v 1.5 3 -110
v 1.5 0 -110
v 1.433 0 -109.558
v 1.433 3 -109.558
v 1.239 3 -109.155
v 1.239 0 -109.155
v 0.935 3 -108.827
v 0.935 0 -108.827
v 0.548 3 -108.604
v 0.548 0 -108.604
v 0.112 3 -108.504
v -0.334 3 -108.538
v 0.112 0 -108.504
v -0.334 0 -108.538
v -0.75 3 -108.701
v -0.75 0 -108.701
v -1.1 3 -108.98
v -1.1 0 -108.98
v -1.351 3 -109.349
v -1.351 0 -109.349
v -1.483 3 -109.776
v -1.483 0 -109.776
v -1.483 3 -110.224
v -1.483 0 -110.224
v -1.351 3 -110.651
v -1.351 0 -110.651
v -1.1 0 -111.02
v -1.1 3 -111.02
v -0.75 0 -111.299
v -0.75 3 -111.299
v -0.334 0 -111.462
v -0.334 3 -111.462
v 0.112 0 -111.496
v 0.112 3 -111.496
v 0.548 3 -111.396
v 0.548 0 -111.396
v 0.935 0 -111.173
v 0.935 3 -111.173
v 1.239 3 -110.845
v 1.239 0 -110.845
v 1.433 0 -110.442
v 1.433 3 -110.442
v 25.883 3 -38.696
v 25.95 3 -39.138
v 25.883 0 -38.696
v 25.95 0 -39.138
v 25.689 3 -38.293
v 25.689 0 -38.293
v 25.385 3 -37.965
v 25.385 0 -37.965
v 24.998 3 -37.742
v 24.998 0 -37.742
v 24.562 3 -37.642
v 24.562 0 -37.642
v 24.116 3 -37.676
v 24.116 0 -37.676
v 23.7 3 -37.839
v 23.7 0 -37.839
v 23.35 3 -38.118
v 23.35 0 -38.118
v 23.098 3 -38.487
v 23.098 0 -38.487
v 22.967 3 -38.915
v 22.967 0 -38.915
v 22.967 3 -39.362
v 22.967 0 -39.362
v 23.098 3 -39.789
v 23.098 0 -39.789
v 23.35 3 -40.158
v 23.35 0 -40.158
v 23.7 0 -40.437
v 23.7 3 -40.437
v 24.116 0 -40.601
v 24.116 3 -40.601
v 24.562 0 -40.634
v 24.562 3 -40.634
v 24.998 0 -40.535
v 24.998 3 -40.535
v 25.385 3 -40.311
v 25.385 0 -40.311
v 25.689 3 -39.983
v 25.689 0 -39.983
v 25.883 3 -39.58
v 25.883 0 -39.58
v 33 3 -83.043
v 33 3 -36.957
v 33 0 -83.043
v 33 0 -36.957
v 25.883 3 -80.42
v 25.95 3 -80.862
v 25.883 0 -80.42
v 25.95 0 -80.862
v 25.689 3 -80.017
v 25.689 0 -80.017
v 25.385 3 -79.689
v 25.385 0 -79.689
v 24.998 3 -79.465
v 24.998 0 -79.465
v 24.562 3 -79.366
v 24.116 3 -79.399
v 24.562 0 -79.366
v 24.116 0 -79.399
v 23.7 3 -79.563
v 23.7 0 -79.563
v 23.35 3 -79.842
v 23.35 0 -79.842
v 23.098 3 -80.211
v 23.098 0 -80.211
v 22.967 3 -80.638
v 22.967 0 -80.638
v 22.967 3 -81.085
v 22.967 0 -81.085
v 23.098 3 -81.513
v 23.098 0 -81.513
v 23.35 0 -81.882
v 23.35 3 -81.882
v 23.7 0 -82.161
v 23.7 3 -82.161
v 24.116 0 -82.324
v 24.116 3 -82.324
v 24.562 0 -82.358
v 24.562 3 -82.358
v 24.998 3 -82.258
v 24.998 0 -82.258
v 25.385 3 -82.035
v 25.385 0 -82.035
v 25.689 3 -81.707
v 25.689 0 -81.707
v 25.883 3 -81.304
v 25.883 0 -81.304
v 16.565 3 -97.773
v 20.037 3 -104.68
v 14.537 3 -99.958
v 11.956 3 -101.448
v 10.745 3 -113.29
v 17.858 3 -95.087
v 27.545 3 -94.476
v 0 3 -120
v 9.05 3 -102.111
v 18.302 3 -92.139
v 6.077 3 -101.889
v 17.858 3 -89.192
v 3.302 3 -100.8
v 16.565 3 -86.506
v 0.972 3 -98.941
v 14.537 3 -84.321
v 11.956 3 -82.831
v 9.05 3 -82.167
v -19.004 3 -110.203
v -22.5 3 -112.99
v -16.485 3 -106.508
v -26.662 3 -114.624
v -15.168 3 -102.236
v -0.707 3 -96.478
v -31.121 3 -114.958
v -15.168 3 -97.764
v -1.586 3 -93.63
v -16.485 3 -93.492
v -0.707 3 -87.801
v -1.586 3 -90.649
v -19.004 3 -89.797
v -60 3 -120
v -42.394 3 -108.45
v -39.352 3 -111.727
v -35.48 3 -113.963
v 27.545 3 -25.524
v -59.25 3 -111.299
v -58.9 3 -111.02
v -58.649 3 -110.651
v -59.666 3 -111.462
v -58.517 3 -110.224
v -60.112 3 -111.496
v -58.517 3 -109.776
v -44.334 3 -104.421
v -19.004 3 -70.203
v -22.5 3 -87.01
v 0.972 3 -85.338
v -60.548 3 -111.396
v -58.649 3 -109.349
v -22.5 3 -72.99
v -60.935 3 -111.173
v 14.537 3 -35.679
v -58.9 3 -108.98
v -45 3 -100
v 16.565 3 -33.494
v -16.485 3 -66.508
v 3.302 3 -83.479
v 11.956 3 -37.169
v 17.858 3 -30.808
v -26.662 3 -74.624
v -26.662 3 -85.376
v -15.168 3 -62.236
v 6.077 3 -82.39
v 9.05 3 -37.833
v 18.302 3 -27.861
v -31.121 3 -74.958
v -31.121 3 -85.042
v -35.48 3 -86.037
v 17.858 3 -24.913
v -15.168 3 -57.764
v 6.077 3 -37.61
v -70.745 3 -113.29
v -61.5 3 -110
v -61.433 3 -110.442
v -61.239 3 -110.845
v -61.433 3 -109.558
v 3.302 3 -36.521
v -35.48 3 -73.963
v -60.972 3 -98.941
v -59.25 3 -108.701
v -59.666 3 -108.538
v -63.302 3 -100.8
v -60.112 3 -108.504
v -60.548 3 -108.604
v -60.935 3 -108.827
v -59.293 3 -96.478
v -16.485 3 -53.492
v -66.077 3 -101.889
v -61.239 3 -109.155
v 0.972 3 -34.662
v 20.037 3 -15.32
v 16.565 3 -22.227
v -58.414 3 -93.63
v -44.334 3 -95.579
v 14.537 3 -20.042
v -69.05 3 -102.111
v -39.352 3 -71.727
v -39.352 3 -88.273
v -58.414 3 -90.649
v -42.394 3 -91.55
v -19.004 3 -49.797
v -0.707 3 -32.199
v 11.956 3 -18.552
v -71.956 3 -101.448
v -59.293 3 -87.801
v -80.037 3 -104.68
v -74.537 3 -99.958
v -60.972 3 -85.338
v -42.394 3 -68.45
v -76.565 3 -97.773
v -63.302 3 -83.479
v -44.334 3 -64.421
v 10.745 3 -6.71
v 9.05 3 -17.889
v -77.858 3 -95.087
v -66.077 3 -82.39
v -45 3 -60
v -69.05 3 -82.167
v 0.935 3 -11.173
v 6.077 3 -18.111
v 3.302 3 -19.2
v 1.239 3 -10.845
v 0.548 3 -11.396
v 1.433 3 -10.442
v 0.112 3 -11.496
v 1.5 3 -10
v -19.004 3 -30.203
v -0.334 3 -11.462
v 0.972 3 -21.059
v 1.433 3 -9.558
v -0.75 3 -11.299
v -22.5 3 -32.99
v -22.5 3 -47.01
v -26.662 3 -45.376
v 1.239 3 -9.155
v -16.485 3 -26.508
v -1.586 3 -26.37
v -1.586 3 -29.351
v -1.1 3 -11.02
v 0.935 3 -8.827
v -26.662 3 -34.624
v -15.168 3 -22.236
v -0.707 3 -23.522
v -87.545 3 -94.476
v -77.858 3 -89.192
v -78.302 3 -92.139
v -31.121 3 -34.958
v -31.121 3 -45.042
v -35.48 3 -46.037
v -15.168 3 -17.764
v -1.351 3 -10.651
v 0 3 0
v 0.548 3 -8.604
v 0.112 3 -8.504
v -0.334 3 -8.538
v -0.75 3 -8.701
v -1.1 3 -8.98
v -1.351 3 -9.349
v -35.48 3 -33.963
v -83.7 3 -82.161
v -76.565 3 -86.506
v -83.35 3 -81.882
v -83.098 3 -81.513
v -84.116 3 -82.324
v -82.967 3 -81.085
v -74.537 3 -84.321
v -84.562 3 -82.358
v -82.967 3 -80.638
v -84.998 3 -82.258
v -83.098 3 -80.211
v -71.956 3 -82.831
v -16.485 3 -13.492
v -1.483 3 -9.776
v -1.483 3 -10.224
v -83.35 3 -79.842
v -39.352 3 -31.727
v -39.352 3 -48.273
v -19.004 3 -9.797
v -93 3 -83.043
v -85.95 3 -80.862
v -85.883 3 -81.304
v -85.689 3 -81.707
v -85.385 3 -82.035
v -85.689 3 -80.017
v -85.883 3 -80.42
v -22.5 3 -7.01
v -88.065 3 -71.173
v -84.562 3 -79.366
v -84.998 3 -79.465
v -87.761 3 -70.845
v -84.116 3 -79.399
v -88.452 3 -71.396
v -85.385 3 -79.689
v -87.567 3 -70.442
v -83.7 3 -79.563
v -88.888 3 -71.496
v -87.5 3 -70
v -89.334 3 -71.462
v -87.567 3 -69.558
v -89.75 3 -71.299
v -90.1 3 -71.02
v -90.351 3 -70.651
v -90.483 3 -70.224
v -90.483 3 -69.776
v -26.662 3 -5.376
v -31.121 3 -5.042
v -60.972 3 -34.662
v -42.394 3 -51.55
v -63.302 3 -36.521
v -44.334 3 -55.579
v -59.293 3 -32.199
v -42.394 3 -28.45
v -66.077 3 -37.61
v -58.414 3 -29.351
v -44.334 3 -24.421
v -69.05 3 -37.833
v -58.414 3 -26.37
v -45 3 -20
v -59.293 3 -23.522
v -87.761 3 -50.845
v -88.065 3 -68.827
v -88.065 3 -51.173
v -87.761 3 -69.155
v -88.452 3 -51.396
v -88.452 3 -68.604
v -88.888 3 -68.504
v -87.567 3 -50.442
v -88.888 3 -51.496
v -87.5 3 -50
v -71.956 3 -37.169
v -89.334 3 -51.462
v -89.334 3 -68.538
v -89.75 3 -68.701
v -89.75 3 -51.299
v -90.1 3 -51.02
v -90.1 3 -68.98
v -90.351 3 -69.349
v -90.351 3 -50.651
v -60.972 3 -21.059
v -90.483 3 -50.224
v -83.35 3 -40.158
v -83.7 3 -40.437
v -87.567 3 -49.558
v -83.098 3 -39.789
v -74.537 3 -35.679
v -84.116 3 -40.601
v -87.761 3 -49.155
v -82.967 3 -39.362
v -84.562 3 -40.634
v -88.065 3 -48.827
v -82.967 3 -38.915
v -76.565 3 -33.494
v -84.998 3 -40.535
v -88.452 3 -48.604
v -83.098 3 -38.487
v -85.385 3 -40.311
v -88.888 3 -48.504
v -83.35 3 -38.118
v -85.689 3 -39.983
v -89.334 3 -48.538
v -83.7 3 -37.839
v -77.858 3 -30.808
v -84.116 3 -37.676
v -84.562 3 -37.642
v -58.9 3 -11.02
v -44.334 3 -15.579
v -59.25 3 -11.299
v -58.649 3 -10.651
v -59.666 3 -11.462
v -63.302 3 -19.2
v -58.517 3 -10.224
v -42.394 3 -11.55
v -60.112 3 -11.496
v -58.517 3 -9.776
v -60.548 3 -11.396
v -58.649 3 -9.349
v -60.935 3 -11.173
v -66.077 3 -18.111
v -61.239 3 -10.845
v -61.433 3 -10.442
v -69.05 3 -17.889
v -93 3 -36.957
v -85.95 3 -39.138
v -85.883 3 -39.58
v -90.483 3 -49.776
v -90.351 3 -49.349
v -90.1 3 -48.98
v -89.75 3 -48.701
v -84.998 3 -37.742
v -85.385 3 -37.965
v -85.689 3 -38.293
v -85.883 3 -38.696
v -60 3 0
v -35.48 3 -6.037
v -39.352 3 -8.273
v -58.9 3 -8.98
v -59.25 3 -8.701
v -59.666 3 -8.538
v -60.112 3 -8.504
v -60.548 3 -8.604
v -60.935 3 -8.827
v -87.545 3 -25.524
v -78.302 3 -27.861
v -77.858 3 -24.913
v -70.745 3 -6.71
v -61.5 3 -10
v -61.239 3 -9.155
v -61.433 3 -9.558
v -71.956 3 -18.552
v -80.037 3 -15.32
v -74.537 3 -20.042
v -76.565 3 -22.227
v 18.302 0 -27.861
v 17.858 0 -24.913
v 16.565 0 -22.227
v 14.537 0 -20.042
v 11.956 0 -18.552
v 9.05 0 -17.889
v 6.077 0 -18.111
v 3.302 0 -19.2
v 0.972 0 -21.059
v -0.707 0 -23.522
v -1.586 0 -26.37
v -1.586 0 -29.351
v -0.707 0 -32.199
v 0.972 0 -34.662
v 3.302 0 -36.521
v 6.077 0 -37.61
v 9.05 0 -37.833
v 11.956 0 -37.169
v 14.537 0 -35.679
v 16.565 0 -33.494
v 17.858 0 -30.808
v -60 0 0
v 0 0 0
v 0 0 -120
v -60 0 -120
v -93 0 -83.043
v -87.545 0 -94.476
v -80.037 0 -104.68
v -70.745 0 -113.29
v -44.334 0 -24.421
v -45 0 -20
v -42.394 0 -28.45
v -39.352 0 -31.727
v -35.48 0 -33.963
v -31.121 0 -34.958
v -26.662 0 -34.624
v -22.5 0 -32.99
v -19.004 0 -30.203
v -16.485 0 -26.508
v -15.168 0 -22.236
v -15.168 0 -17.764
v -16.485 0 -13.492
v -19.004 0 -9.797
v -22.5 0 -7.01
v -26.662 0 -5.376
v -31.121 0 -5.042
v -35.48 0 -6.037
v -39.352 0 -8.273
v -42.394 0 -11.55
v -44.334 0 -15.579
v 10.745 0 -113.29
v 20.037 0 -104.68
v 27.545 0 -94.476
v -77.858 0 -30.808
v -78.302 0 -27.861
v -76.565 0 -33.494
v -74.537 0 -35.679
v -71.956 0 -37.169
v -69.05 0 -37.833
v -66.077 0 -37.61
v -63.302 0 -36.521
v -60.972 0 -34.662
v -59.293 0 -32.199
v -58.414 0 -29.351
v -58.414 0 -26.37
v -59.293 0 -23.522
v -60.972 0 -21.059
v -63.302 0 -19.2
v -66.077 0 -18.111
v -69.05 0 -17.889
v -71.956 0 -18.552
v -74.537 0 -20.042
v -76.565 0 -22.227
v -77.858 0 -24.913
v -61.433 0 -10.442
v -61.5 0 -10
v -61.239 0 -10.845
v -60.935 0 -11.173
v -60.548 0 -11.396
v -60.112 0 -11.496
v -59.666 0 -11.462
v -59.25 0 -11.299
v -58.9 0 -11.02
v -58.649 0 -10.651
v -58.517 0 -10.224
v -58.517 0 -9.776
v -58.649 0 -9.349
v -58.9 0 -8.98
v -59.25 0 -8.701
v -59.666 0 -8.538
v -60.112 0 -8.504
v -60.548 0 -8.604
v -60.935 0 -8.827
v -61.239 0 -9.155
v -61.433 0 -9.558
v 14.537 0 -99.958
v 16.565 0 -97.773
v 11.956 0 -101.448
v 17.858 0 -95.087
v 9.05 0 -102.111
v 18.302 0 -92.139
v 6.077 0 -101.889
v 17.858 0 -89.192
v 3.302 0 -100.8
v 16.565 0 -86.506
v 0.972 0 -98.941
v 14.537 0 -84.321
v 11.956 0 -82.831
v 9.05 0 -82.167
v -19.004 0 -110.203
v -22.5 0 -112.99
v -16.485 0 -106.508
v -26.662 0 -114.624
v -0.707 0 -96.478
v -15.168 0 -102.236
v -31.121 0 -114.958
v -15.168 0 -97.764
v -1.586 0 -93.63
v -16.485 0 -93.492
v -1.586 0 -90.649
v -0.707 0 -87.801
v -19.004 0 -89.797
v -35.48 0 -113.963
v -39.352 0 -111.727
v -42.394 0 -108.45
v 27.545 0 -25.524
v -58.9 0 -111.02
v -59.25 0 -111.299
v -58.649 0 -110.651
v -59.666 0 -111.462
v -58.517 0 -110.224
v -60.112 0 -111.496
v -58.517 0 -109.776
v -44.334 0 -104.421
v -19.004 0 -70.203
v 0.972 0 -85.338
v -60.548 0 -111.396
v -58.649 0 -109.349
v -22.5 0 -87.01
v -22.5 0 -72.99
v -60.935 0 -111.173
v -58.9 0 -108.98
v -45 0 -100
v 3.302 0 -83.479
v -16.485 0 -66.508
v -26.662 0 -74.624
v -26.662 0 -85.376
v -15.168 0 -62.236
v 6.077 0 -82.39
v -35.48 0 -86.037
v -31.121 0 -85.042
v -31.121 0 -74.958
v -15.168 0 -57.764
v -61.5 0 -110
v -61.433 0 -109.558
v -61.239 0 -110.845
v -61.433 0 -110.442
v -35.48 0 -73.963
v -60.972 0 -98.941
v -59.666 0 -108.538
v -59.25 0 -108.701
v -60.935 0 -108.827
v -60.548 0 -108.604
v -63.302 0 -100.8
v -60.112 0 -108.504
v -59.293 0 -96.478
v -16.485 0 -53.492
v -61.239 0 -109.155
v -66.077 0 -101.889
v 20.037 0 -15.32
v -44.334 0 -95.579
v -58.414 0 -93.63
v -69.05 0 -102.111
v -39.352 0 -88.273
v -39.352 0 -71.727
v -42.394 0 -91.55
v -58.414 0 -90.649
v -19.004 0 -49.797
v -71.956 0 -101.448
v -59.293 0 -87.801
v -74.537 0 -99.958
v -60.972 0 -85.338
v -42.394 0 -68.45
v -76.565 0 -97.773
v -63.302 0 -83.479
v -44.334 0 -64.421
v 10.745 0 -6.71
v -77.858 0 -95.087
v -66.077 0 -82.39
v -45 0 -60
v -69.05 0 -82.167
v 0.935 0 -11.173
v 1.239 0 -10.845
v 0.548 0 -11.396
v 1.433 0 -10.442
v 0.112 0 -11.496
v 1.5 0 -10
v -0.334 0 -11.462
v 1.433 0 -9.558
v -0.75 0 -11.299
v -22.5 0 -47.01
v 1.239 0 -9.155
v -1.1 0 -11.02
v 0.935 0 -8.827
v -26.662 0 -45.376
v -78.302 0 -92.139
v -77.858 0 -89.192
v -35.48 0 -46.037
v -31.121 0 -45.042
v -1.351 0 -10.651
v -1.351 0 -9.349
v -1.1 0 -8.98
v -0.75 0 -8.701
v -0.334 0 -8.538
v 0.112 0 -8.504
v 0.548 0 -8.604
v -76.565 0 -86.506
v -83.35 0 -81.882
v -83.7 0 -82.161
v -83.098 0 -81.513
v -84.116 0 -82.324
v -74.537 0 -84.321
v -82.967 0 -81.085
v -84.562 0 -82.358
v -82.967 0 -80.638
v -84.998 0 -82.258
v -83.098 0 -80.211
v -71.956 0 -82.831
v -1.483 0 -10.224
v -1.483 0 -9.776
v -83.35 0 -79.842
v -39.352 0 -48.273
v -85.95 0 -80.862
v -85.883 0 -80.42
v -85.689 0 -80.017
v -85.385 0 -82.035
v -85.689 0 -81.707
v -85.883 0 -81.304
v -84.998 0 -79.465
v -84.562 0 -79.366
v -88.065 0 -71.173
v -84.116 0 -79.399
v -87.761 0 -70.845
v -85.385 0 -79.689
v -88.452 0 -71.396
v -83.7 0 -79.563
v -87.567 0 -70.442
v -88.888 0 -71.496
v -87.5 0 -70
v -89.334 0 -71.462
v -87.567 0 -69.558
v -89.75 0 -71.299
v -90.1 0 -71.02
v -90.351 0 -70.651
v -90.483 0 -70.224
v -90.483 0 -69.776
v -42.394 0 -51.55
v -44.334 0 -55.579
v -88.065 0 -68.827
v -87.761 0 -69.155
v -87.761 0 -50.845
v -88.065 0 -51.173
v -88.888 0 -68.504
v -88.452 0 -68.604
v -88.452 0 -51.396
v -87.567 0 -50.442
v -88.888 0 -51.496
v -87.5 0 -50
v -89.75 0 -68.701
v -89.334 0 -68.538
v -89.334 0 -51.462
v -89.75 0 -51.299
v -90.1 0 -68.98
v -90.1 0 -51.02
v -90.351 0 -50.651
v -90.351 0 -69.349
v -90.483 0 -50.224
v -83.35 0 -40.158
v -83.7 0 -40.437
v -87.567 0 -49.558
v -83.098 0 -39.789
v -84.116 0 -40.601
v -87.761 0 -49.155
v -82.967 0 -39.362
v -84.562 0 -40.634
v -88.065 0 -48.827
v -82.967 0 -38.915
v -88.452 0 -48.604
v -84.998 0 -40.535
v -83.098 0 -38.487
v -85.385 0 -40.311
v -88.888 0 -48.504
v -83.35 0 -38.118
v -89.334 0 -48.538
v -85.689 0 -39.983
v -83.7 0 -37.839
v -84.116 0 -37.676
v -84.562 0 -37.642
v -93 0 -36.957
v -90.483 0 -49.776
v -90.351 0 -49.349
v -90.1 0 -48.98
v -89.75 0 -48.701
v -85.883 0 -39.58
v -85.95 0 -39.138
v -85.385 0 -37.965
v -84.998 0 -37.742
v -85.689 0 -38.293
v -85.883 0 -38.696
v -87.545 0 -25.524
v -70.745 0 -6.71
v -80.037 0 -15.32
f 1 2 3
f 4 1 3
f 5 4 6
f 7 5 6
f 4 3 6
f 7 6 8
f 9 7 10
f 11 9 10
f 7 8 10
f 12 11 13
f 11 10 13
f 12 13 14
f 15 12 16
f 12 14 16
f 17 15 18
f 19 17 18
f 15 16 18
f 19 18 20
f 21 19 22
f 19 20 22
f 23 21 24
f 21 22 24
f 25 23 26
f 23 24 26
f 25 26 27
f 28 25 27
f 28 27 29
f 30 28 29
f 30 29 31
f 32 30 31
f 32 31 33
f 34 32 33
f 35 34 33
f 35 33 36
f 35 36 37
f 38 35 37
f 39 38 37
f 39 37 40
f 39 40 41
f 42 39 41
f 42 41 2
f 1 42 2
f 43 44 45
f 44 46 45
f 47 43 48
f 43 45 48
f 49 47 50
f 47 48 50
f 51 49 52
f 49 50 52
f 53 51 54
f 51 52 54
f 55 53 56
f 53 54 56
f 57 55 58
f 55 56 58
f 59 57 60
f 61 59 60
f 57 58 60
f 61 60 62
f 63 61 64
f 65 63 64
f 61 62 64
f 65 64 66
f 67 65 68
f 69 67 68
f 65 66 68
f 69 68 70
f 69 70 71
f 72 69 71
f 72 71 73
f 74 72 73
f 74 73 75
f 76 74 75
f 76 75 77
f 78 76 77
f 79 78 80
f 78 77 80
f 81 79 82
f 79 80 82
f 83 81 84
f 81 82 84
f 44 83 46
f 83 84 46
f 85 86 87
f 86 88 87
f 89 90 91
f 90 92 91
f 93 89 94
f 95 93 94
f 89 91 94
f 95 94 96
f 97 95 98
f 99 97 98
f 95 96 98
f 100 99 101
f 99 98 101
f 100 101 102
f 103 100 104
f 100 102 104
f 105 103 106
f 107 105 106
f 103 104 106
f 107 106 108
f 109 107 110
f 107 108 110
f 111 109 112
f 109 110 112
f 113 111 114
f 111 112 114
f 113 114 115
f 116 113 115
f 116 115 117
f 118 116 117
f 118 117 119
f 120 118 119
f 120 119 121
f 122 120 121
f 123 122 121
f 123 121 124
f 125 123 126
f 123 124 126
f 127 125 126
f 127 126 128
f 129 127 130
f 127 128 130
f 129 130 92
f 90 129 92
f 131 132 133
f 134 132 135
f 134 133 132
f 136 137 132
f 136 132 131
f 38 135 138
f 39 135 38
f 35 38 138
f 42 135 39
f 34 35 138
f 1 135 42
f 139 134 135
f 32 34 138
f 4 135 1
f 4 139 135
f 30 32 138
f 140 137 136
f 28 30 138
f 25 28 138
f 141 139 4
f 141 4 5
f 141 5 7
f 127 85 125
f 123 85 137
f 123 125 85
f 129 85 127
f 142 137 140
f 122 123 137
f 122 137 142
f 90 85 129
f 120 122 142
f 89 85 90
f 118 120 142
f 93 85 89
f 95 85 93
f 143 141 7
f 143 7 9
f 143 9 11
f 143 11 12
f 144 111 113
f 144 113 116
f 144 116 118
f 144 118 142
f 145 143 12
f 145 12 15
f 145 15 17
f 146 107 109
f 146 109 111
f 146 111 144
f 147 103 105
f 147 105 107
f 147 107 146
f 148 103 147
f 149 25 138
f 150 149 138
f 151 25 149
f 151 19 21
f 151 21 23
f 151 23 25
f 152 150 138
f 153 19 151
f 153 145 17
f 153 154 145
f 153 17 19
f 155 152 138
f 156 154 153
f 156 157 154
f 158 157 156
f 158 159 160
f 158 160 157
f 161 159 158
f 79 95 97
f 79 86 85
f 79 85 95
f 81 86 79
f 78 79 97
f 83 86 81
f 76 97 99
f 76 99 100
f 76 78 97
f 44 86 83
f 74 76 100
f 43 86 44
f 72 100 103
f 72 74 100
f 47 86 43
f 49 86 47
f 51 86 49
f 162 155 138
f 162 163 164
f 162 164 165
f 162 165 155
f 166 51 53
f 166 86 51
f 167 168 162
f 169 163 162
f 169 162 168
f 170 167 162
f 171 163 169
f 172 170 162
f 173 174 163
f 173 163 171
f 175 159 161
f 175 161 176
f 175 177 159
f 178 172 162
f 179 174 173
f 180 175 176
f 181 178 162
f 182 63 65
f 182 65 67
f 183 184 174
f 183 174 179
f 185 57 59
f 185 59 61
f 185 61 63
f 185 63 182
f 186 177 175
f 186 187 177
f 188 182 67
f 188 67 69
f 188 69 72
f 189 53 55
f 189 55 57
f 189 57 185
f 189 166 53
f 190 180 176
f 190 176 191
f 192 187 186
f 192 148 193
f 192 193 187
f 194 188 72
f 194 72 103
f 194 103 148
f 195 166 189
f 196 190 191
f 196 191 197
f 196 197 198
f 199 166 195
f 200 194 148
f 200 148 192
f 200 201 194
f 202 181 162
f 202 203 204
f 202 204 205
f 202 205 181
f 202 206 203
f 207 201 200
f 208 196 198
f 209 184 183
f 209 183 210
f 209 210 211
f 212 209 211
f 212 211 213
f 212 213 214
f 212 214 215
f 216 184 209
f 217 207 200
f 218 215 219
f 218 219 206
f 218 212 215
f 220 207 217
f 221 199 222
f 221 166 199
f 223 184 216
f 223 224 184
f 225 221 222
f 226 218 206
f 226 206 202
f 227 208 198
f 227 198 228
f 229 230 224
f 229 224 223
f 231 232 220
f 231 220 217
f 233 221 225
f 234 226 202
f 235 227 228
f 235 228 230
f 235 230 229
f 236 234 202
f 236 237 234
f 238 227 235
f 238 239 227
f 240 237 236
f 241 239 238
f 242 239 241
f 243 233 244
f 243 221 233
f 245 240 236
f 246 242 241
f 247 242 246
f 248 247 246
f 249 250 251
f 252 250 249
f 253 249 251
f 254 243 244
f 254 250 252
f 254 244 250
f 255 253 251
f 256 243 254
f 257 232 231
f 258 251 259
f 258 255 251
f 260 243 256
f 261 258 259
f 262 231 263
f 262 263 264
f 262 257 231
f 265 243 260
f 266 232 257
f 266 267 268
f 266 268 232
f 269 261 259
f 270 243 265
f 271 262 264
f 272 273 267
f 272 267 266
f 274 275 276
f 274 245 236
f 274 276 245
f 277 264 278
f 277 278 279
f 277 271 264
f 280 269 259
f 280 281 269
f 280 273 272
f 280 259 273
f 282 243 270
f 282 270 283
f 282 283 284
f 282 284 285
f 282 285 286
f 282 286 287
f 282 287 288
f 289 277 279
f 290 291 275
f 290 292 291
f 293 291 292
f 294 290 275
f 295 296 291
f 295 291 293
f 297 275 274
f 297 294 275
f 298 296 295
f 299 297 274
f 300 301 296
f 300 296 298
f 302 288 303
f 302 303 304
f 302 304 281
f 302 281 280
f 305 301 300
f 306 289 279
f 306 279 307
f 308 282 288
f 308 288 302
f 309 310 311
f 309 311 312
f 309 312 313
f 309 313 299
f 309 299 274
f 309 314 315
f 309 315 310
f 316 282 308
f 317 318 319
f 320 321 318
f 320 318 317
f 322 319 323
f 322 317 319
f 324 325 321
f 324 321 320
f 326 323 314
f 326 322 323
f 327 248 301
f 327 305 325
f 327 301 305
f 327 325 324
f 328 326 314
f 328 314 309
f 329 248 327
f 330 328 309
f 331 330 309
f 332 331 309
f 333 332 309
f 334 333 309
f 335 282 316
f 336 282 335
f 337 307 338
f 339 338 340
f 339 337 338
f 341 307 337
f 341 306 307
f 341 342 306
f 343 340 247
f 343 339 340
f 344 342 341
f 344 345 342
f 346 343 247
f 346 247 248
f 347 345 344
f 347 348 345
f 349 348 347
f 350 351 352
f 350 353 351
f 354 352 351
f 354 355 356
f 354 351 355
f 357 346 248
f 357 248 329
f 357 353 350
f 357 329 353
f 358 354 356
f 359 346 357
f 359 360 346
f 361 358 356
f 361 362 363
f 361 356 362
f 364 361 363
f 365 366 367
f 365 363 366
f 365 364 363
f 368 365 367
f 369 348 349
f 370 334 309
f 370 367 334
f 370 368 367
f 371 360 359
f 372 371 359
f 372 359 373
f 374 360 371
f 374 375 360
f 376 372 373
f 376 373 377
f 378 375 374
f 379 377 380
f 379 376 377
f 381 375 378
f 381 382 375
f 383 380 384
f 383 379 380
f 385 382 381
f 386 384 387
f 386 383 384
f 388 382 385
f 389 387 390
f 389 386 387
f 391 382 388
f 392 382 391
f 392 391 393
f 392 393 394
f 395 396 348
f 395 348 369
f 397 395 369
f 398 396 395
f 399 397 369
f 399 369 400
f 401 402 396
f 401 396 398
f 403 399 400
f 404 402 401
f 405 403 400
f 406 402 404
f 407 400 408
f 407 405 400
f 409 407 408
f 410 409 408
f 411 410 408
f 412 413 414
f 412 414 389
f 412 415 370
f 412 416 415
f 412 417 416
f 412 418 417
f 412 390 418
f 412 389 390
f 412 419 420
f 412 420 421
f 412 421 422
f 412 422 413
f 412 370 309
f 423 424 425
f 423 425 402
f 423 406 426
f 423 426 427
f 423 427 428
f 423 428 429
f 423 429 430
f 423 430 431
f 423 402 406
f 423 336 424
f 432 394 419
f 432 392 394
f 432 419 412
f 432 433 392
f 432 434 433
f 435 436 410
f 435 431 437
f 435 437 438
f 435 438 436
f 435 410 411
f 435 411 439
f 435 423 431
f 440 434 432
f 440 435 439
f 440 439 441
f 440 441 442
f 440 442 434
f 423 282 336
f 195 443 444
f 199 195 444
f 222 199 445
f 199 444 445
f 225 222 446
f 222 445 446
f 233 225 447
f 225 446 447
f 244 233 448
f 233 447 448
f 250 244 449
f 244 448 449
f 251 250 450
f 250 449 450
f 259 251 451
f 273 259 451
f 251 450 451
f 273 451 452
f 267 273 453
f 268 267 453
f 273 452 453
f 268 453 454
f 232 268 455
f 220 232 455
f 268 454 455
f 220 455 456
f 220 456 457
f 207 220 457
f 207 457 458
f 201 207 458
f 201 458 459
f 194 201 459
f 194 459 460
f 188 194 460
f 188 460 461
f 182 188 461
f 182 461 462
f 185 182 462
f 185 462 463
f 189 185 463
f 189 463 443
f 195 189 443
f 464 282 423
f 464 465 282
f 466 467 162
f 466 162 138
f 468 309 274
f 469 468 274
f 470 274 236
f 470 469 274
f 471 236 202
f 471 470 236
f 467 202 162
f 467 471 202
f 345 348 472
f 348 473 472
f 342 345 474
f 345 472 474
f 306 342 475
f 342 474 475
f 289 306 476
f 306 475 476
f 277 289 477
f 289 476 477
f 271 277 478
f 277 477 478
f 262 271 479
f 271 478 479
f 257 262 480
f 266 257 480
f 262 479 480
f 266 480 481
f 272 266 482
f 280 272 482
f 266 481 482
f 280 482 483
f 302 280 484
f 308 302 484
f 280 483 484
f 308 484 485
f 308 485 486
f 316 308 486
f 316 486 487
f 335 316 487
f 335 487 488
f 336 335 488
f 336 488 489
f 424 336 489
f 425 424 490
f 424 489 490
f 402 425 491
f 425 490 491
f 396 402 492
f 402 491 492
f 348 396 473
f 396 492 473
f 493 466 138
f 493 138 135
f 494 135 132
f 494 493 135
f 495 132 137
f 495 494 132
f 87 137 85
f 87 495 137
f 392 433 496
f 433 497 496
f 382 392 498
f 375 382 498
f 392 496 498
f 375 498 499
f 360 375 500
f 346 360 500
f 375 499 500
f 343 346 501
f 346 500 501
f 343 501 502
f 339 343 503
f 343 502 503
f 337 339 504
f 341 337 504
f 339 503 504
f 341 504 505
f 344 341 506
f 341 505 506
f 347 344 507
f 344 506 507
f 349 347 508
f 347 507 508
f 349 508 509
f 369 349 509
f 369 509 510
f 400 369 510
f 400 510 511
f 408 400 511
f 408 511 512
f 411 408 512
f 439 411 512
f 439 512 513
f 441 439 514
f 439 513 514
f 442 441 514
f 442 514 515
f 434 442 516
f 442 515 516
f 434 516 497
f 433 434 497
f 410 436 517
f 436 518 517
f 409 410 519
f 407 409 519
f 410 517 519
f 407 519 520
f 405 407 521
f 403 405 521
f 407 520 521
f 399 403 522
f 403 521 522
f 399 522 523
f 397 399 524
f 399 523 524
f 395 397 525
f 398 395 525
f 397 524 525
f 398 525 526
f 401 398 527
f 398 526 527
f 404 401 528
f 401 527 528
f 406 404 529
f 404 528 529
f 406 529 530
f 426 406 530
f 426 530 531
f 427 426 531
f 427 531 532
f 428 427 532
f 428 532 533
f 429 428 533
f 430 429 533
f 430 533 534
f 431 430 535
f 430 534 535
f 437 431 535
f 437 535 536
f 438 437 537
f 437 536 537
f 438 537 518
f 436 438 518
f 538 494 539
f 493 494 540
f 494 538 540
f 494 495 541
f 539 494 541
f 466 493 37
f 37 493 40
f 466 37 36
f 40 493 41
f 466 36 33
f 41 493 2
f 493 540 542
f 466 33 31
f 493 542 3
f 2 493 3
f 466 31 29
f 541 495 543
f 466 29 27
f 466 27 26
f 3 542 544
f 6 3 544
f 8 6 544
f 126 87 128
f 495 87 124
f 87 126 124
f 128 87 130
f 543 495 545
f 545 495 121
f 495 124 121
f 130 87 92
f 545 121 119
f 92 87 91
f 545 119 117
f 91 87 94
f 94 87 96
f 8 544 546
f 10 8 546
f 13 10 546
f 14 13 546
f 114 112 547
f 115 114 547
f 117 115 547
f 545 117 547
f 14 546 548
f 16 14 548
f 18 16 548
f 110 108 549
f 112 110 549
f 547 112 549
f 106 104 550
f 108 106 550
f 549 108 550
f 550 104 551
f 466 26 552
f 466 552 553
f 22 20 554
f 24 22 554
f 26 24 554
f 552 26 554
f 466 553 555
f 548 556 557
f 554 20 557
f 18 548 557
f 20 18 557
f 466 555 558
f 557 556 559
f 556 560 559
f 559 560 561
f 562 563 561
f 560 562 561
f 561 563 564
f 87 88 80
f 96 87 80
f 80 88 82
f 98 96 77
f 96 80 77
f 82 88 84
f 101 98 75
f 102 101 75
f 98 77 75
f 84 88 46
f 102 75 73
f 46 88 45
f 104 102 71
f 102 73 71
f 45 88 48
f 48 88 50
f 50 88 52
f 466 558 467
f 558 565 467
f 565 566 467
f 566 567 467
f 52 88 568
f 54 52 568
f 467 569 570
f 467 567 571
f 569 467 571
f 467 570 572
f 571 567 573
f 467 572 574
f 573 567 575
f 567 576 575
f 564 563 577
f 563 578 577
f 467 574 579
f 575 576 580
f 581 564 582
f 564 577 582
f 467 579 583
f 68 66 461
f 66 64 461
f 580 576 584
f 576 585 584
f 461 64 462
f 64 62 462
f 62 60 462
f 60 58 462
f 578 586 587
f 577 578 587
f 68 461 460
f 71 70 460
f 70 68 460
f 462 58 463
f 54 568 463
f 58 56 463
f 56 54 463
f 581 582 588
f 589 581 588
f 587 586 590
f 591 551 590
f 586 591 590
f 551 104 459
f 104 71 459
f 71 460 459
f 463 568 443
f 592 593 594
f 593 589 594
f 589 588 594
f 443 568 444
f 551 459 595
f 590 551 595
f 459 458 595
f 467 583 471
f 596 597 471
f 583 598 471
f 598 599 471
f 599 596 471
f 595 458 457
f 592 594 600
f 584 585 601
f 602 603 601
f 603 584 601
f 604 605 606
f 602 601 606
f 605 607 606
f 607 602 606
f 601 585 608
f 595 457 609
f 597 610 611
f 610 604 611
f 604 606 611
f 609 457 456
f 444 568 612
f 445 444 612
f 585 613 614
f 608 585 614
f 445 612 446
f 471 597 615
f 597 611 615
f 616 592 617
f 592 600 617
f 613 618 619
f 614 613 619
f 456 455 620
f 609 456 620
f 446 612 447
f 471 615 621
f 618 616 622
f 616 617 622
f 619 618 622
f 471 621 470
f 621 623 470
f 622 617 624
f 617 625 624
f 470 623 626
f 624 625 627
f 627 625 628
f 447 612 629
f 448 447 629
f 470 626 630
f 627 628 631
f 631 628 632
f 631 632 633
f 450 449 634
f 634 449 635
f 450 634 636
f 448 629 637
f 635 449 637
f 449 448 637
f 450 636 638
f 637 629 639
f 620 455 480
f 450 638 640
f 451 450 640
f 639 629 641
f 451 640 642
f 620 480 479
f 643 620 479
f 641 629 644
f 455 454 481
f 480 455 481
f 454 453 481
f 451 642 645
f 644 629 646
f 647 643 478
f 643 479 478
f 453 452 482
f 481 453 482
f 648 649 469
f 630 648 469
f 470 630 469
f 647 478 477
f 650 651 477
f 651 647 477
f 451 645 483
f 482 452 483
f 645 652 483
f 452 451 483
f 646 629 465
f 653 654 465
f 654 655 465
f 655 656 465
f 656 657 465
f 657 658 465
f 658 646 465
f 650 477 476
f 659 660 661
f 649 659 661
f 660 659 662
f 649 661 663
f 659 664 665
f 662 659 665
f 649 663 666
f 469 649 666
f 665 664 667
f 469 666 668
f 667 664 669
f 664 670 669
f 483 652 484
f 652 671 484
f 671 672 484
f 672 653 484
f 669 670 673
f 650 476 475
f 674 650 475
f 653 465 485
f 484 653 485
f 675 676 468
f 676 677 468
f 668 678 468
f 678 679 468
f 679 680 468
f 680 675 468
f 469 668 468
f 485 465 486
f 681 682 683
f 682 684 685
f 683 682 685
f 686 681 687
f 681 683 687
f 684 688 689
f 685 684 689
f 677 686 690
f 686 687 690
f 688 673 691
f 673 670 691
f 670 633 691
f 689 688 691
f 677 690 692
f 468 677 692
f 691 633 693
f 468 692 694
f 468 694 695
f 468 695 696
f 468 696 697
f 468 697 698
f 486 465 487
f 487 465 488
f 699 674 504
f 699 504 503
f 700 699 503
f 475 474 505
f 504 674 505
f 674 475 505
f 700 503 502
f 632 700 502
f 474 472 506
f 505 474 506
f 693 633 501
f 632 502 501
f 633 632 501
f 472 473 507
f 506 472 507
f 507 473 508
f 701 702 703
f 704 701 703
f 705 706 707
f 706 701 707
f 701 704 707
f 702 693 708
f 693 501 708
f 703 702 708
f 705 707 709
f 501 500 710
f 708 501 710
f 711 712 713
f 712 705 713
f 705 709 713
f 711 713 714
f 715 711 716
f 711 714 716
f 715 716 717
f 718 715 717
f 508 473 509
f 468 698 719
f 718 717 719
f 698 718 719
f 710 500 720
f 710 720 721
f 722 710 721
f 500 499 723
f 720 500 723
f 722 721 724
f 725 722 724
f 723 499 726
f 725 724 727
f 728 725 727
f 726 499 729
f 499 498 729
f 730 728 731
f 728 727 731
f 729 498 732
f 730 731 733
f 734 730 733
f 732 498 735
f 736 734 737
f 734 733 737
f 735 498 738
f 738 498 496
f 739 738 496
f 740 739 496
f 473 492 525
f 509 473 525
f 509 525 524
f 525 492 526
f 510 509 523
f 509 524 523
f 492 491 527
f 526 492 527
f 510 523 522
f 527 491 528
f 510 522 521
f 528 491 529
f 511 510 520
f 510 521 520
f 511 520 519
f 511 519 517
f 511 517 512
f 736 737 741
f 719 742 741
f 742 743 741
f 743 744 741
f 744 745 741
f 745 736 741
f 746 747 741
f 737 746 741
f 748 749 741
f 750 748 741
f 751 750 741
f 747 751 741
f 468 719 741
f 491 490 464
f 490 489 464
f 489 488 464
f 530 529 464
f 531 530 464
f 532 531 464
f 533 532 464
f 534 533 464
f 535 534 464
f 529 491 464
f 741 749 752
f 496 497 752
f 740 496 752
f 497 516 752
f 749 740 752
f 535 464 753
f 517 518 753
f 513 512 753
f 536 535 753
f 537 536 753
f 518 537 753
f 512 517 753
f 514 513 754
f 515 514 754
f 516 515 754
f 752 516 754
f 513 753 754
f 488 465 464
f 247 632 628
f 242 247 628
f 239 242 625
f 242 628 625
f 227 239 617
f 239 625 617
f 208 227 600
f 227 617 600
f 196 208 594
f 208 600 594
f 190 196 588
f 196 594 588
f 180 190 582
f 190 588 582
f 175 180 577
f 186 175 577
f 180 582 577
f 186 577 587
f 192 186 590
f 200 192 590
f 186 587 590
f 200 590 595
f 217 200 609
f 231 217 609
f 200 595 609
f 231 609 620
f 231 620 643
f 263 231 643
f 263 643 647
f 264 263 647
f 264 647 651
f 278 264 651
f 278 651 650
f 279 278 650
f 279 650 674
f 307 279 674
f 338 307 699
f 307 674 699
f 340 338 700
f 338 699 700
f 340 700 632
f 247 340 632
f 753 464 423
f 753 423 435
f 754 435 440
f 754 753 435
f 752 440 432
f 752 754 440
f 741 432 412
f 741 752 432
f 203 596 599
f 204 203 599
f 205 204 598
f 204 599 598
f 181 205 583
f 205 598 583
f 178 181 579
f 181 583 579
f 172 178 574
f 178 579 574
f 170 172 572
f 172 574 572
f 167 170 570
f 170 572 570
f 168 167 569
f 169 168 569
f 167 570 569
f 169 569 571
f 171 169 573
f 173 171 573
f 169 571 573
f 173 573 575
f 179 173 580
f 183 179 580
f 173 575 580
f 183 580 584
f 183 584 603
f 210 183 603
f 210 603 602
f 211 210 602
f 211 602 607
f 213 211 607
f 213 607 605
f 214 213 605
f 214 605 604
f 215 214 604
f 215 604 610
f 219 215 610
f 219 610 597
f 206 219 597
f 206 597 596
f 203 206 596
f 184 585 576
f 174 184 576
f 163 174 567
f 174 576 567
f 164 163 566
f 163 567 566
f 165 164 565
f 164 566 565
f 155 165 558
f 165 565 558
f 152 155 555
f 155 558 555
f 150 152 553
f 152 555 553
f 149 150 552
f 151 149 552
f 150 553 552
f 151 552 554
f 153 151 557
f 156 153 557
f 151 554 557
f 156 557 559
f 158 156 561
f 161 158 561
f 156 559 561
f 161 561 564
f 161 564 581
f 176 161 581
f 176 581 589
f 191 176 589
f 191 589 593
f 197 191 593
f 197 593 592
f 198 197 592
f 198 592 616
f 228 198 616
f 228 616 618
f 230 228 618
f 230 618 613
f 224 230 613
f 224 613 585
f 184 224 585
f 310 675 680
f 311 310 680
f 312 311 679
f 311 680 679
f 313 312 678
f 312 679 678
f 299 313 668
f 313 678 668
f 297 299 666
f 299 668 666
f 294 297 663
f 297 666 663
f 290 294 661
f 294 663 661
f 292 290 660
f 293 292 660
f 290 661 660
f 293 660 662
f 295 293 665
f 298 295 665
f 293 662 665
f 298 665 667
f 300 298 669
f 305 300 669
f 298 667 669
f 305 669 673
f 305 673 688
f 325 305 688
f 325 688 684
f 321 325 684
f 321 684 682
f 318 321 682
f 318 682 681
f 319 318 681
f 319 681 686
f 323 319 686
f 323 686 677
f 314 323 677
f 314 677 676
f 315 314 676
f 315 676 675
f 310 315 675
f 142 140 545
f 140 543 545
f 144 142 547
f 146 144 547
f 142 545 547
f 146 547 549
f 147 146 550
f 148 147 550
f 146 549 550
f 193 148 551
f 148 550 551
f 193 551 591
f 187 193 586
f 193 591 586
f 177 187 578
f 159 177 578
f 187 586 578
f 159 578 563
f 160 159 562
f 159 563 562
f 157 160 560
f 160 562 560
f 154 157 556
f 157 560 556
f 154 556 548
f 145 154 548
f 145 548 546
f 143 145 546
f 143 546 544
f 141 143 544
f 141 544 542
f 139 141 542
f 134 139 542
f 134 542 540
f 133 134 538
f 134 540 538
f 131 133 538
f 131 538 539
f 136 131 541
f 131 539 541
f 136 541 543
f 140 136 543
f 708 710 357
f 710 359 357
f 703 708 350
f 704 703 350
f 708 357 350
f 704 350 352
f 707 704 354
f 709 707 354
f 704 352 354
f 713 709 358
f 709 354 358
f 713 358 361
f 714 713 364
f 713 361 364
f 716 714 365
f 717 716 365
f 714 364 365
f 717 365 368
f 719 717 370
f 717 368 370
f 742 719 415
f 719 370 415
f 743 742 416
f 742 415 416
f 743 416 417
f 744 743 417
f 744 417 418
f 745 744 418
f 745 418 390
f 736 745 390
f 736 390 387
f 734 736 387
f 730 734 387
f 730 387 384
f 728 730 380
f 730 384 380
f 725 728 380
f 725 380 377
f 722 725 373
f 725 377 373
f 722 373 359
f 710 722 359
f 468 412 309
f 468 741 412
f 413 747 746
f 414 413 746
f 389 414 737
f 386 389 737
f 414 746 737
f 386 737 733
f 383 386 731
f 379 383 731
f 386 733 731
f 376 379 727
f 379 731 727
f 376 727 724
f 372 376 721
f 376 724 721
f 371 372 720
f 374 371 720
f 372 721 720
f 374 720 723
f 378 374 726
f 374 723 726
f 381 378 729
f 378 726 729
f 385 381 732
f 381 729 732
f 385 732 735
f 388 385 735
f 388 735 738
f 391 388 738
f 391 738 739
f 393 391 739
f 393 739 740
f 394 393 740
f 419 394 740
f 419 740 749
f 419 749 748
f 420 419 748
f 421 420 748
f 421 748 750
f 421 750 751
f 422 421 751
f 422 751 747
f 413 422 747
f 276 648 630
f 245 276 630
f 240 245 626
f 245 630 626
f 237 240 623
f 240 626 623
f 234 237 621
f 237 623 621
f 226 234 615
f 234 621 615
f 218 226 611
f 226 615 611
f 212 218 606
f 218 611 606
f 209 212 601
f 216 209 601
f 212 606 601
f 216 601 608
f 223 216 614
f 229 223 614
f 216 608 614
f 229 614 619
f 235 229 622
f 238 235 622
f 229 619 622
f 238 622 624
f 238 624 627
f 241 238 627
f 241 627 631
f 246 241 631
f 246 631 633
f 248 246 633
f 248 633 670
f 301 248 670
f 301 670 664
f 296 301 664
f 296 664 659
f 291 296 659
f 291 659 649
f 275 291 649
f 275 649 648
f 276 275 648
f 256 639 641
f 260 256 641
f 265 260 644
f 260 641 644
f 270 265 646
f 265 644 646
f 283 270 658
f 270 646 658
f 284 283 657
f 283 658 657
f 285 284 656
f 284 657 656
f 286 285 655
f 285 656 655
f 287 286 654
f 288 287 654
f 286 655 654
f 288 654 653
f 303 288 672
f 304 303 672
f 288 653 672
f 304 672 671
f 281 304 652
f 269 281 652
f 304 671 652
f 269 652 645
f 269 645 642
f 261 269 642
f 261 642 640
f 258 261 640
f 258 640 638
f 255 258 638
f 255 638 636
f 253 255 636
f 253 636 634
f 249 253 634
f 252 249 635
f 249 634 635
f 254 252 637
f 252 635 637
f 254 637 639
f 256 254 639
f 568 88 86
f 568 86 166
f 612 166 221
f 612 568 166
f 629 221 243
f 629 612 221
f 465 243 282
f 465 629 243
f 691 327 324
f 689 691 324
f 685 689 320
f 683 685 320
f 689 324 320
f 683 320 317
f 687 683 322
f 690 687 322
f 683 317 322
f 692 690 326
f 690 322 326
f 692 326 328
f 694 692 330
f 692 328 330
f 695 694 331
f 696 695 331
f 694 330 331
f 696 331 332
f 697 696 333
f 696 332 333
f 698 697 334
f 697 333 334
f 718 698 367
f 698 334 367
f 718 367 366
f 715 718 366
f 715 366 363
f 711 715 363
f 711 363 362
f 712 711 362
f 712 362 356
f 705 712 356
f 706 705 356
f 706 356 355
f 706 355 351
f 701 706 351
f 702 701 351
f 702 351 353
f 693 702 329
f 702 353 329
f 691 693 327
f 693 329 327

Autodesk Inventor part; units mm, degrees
ref_plane "XZ Plane" through (0, 0, 0) normal (0, 1, 0) x (-1, 0, 0)
ref_plane "XY Plane" through (0, 0, 0) normal (0, 0, 1) x (1, 0, 0)
sketch "Sketch1" plane through (0, 0, 0) normal (0, 1, 0) x (-1, 0, 0)
  line L0 (0, 0) -> (60, 0)
  line L1 (60, 0) -> (60, -120)
  line L2 (60, -120) -> (0, -120)
  line L3 (0, -120) -> (0, 0)
  line L4 (60, 0) -> (0, -120) construction
  line L5 (60, -120) -> (0, 0) construction
  circle A0 centre (30, -60) radius 67.082
  line L6 (30, -120) -> (30, 7.082) construction
  line L7 (60, -60) -> (0, -60)
  line L8 (30, -60) -> (81.3878, -103.1195) construction
  line L9 (41.76, -45.985) -> (17.4815, -74.919) construction
  line L10 (-33, -36.9566) -> (-33, -83.0434)
  line L11 (93, -36.9566) -> (93, -83.0434)
  circle A1 centre (60, -110) radius 1.5
  circle A2 centre (70, -60) radius 12.5
  circle A3 centre (30, -100) radius 15
  circle A4 centre (84.4498, -80.8618) radius 1.5
  circle A5 centre (68.3022, -92.1394) radius 10
  circle A6 centre (30, -60) radius 15
  point P0 (60, -120)
  point P1 (60, 0)
  dimension "d0" = 120
  dimension "d25" = 60
  dimension "d27" = 50
  dimension "d38" = 63
  dimension "d39" = 63
  dimension "d50" = 3
  dimension "d51" = 10
  dimension "d52" = 25
  dimension "d53" = 40
  dimension "d54" = 30
  dimension "d55" = 40
  dimension "d56" = 20
  dimension "d57" = 50
  dimension "d58" = 30
extrude "Extrusion1" add sketch "Sketch1" along normal blind 3 contours L0 L1 A2 L7 A6 L3 | L3 A0 L10 | A0 L11 L1 A1 A5 A2 | L7 A6 A2 L1 A5 A1 L2 L3 | A2 L1 | L1 L7 A2 | A6 L7 | L7 A6 | L1 A2 L7 | A1 L1 | L1 A1 | A5 L1 | L1 A5 | A3 | A4
extrude "Extrusion3" cut sketch "Sketch1" along normal blind 10 contours A6 L7 | L7 A6 | A1 L1 | L1 A1 | A5 L1 | L1 A5 | A3 | A4
ref_plane "Work Plane5" through (-60, 0, -60) normal (0, 0, 1) x (1, 0, 0)
ref_plane "Work Plane6" through (-30, 0, 0) normal (1, 0, 0) x (0, 1, 0)
mirror "Mirror3" about plane through (-60, 0, -60) normal (0, 0, 1) of "Extrusion3"
mirror "Mirror4" about plane through (-30, 0, 0) normal (1, 0, 0) of "Extrusion3", "Mirror3"
sketch "Sketch10" plane through (0, 3, 0) normal (0, 1, 0) x (1, 0, 0)
  circle A0 centre (24.4498, 39.1382) radius 1.5 projected
  circle A1 centre (8.3022, 27.8606) radius 10 projected
  circle A2 centre (0, 10) radius 1.5 projected
  circle A3 centre (24.4498, 80.8618) radius 1.5 projected
  circle A4 centre (8.3022, 92.1394) radius 10 projected
  circle A5 centre (0, 110) radius 1.5 projected
  circle A6 centre (-84.4498, 39.1382) radius 1.5 projected
  circle A7 centre (-68.3022, 27.8606) radius 10 projected
  circle A8 centre (-60, 10) radius 1.5 projected
  circle A9 centre (-30, 20) radius 15 projected
  circle A10 centre (-84.4498, 80.8618) radius 1.5 projected
  circle A11 centre (-68.3022, 92.1394) radius 10 projected
  circle A12 centre (-60, 110) radius 1.5 projected
  circle A13 centre (-30, 100) radius 15 projected
  circle A14 centre (-30, 60) radius 15 projected
  line L0 (0, 120) -> (-60, 120) projected
  arc A15 (-60, 120) -> (-93, 83.0434) centre (-30, 60) ccw projected
  line L1 (-93, 83.0434) -> (-93, 36.9566) projected
  arc A16 (-93, 36.9566) -> (-60, 0) centre (-30, 60) ccw projected
  line L2 (-60, 0) -> (0, 0) projected
  arc A17 (0, 0) -> (33, 36.9566) centre (-30, 60) ccw projected
  line L3 (33, 36.9566) -> (33, 83.0434) projected
  arc A18 (33, 83.0434) -> (0, 120) centre (-30, 60) ccw projected
sketch "Sketch14" plane through (0, 3, 0) normal (0, 1, 0) x (1, 0, 0)
  circle A0 centre (-89, 70) radius 1.5
  circle A1 centre (-89, 50) radius 1.5
  line L0 (-93, 83.0434) -> (-93, 36.9566) projected
  line L1 (63.1517, 60) -> (-123.1517, 60) projected
  point P0 (0, 0)
  dimension "d75" = 3
  dimension "d76" = 3
  dimension "d77" = 4
  dimension "d78" = 4
  dimension "d79" = 10
  dimension "d80" = 10
extrude "Extrusion6" cut sketch "Sketch14" against normal blind 10
properties part number "Drone_plate_3"
